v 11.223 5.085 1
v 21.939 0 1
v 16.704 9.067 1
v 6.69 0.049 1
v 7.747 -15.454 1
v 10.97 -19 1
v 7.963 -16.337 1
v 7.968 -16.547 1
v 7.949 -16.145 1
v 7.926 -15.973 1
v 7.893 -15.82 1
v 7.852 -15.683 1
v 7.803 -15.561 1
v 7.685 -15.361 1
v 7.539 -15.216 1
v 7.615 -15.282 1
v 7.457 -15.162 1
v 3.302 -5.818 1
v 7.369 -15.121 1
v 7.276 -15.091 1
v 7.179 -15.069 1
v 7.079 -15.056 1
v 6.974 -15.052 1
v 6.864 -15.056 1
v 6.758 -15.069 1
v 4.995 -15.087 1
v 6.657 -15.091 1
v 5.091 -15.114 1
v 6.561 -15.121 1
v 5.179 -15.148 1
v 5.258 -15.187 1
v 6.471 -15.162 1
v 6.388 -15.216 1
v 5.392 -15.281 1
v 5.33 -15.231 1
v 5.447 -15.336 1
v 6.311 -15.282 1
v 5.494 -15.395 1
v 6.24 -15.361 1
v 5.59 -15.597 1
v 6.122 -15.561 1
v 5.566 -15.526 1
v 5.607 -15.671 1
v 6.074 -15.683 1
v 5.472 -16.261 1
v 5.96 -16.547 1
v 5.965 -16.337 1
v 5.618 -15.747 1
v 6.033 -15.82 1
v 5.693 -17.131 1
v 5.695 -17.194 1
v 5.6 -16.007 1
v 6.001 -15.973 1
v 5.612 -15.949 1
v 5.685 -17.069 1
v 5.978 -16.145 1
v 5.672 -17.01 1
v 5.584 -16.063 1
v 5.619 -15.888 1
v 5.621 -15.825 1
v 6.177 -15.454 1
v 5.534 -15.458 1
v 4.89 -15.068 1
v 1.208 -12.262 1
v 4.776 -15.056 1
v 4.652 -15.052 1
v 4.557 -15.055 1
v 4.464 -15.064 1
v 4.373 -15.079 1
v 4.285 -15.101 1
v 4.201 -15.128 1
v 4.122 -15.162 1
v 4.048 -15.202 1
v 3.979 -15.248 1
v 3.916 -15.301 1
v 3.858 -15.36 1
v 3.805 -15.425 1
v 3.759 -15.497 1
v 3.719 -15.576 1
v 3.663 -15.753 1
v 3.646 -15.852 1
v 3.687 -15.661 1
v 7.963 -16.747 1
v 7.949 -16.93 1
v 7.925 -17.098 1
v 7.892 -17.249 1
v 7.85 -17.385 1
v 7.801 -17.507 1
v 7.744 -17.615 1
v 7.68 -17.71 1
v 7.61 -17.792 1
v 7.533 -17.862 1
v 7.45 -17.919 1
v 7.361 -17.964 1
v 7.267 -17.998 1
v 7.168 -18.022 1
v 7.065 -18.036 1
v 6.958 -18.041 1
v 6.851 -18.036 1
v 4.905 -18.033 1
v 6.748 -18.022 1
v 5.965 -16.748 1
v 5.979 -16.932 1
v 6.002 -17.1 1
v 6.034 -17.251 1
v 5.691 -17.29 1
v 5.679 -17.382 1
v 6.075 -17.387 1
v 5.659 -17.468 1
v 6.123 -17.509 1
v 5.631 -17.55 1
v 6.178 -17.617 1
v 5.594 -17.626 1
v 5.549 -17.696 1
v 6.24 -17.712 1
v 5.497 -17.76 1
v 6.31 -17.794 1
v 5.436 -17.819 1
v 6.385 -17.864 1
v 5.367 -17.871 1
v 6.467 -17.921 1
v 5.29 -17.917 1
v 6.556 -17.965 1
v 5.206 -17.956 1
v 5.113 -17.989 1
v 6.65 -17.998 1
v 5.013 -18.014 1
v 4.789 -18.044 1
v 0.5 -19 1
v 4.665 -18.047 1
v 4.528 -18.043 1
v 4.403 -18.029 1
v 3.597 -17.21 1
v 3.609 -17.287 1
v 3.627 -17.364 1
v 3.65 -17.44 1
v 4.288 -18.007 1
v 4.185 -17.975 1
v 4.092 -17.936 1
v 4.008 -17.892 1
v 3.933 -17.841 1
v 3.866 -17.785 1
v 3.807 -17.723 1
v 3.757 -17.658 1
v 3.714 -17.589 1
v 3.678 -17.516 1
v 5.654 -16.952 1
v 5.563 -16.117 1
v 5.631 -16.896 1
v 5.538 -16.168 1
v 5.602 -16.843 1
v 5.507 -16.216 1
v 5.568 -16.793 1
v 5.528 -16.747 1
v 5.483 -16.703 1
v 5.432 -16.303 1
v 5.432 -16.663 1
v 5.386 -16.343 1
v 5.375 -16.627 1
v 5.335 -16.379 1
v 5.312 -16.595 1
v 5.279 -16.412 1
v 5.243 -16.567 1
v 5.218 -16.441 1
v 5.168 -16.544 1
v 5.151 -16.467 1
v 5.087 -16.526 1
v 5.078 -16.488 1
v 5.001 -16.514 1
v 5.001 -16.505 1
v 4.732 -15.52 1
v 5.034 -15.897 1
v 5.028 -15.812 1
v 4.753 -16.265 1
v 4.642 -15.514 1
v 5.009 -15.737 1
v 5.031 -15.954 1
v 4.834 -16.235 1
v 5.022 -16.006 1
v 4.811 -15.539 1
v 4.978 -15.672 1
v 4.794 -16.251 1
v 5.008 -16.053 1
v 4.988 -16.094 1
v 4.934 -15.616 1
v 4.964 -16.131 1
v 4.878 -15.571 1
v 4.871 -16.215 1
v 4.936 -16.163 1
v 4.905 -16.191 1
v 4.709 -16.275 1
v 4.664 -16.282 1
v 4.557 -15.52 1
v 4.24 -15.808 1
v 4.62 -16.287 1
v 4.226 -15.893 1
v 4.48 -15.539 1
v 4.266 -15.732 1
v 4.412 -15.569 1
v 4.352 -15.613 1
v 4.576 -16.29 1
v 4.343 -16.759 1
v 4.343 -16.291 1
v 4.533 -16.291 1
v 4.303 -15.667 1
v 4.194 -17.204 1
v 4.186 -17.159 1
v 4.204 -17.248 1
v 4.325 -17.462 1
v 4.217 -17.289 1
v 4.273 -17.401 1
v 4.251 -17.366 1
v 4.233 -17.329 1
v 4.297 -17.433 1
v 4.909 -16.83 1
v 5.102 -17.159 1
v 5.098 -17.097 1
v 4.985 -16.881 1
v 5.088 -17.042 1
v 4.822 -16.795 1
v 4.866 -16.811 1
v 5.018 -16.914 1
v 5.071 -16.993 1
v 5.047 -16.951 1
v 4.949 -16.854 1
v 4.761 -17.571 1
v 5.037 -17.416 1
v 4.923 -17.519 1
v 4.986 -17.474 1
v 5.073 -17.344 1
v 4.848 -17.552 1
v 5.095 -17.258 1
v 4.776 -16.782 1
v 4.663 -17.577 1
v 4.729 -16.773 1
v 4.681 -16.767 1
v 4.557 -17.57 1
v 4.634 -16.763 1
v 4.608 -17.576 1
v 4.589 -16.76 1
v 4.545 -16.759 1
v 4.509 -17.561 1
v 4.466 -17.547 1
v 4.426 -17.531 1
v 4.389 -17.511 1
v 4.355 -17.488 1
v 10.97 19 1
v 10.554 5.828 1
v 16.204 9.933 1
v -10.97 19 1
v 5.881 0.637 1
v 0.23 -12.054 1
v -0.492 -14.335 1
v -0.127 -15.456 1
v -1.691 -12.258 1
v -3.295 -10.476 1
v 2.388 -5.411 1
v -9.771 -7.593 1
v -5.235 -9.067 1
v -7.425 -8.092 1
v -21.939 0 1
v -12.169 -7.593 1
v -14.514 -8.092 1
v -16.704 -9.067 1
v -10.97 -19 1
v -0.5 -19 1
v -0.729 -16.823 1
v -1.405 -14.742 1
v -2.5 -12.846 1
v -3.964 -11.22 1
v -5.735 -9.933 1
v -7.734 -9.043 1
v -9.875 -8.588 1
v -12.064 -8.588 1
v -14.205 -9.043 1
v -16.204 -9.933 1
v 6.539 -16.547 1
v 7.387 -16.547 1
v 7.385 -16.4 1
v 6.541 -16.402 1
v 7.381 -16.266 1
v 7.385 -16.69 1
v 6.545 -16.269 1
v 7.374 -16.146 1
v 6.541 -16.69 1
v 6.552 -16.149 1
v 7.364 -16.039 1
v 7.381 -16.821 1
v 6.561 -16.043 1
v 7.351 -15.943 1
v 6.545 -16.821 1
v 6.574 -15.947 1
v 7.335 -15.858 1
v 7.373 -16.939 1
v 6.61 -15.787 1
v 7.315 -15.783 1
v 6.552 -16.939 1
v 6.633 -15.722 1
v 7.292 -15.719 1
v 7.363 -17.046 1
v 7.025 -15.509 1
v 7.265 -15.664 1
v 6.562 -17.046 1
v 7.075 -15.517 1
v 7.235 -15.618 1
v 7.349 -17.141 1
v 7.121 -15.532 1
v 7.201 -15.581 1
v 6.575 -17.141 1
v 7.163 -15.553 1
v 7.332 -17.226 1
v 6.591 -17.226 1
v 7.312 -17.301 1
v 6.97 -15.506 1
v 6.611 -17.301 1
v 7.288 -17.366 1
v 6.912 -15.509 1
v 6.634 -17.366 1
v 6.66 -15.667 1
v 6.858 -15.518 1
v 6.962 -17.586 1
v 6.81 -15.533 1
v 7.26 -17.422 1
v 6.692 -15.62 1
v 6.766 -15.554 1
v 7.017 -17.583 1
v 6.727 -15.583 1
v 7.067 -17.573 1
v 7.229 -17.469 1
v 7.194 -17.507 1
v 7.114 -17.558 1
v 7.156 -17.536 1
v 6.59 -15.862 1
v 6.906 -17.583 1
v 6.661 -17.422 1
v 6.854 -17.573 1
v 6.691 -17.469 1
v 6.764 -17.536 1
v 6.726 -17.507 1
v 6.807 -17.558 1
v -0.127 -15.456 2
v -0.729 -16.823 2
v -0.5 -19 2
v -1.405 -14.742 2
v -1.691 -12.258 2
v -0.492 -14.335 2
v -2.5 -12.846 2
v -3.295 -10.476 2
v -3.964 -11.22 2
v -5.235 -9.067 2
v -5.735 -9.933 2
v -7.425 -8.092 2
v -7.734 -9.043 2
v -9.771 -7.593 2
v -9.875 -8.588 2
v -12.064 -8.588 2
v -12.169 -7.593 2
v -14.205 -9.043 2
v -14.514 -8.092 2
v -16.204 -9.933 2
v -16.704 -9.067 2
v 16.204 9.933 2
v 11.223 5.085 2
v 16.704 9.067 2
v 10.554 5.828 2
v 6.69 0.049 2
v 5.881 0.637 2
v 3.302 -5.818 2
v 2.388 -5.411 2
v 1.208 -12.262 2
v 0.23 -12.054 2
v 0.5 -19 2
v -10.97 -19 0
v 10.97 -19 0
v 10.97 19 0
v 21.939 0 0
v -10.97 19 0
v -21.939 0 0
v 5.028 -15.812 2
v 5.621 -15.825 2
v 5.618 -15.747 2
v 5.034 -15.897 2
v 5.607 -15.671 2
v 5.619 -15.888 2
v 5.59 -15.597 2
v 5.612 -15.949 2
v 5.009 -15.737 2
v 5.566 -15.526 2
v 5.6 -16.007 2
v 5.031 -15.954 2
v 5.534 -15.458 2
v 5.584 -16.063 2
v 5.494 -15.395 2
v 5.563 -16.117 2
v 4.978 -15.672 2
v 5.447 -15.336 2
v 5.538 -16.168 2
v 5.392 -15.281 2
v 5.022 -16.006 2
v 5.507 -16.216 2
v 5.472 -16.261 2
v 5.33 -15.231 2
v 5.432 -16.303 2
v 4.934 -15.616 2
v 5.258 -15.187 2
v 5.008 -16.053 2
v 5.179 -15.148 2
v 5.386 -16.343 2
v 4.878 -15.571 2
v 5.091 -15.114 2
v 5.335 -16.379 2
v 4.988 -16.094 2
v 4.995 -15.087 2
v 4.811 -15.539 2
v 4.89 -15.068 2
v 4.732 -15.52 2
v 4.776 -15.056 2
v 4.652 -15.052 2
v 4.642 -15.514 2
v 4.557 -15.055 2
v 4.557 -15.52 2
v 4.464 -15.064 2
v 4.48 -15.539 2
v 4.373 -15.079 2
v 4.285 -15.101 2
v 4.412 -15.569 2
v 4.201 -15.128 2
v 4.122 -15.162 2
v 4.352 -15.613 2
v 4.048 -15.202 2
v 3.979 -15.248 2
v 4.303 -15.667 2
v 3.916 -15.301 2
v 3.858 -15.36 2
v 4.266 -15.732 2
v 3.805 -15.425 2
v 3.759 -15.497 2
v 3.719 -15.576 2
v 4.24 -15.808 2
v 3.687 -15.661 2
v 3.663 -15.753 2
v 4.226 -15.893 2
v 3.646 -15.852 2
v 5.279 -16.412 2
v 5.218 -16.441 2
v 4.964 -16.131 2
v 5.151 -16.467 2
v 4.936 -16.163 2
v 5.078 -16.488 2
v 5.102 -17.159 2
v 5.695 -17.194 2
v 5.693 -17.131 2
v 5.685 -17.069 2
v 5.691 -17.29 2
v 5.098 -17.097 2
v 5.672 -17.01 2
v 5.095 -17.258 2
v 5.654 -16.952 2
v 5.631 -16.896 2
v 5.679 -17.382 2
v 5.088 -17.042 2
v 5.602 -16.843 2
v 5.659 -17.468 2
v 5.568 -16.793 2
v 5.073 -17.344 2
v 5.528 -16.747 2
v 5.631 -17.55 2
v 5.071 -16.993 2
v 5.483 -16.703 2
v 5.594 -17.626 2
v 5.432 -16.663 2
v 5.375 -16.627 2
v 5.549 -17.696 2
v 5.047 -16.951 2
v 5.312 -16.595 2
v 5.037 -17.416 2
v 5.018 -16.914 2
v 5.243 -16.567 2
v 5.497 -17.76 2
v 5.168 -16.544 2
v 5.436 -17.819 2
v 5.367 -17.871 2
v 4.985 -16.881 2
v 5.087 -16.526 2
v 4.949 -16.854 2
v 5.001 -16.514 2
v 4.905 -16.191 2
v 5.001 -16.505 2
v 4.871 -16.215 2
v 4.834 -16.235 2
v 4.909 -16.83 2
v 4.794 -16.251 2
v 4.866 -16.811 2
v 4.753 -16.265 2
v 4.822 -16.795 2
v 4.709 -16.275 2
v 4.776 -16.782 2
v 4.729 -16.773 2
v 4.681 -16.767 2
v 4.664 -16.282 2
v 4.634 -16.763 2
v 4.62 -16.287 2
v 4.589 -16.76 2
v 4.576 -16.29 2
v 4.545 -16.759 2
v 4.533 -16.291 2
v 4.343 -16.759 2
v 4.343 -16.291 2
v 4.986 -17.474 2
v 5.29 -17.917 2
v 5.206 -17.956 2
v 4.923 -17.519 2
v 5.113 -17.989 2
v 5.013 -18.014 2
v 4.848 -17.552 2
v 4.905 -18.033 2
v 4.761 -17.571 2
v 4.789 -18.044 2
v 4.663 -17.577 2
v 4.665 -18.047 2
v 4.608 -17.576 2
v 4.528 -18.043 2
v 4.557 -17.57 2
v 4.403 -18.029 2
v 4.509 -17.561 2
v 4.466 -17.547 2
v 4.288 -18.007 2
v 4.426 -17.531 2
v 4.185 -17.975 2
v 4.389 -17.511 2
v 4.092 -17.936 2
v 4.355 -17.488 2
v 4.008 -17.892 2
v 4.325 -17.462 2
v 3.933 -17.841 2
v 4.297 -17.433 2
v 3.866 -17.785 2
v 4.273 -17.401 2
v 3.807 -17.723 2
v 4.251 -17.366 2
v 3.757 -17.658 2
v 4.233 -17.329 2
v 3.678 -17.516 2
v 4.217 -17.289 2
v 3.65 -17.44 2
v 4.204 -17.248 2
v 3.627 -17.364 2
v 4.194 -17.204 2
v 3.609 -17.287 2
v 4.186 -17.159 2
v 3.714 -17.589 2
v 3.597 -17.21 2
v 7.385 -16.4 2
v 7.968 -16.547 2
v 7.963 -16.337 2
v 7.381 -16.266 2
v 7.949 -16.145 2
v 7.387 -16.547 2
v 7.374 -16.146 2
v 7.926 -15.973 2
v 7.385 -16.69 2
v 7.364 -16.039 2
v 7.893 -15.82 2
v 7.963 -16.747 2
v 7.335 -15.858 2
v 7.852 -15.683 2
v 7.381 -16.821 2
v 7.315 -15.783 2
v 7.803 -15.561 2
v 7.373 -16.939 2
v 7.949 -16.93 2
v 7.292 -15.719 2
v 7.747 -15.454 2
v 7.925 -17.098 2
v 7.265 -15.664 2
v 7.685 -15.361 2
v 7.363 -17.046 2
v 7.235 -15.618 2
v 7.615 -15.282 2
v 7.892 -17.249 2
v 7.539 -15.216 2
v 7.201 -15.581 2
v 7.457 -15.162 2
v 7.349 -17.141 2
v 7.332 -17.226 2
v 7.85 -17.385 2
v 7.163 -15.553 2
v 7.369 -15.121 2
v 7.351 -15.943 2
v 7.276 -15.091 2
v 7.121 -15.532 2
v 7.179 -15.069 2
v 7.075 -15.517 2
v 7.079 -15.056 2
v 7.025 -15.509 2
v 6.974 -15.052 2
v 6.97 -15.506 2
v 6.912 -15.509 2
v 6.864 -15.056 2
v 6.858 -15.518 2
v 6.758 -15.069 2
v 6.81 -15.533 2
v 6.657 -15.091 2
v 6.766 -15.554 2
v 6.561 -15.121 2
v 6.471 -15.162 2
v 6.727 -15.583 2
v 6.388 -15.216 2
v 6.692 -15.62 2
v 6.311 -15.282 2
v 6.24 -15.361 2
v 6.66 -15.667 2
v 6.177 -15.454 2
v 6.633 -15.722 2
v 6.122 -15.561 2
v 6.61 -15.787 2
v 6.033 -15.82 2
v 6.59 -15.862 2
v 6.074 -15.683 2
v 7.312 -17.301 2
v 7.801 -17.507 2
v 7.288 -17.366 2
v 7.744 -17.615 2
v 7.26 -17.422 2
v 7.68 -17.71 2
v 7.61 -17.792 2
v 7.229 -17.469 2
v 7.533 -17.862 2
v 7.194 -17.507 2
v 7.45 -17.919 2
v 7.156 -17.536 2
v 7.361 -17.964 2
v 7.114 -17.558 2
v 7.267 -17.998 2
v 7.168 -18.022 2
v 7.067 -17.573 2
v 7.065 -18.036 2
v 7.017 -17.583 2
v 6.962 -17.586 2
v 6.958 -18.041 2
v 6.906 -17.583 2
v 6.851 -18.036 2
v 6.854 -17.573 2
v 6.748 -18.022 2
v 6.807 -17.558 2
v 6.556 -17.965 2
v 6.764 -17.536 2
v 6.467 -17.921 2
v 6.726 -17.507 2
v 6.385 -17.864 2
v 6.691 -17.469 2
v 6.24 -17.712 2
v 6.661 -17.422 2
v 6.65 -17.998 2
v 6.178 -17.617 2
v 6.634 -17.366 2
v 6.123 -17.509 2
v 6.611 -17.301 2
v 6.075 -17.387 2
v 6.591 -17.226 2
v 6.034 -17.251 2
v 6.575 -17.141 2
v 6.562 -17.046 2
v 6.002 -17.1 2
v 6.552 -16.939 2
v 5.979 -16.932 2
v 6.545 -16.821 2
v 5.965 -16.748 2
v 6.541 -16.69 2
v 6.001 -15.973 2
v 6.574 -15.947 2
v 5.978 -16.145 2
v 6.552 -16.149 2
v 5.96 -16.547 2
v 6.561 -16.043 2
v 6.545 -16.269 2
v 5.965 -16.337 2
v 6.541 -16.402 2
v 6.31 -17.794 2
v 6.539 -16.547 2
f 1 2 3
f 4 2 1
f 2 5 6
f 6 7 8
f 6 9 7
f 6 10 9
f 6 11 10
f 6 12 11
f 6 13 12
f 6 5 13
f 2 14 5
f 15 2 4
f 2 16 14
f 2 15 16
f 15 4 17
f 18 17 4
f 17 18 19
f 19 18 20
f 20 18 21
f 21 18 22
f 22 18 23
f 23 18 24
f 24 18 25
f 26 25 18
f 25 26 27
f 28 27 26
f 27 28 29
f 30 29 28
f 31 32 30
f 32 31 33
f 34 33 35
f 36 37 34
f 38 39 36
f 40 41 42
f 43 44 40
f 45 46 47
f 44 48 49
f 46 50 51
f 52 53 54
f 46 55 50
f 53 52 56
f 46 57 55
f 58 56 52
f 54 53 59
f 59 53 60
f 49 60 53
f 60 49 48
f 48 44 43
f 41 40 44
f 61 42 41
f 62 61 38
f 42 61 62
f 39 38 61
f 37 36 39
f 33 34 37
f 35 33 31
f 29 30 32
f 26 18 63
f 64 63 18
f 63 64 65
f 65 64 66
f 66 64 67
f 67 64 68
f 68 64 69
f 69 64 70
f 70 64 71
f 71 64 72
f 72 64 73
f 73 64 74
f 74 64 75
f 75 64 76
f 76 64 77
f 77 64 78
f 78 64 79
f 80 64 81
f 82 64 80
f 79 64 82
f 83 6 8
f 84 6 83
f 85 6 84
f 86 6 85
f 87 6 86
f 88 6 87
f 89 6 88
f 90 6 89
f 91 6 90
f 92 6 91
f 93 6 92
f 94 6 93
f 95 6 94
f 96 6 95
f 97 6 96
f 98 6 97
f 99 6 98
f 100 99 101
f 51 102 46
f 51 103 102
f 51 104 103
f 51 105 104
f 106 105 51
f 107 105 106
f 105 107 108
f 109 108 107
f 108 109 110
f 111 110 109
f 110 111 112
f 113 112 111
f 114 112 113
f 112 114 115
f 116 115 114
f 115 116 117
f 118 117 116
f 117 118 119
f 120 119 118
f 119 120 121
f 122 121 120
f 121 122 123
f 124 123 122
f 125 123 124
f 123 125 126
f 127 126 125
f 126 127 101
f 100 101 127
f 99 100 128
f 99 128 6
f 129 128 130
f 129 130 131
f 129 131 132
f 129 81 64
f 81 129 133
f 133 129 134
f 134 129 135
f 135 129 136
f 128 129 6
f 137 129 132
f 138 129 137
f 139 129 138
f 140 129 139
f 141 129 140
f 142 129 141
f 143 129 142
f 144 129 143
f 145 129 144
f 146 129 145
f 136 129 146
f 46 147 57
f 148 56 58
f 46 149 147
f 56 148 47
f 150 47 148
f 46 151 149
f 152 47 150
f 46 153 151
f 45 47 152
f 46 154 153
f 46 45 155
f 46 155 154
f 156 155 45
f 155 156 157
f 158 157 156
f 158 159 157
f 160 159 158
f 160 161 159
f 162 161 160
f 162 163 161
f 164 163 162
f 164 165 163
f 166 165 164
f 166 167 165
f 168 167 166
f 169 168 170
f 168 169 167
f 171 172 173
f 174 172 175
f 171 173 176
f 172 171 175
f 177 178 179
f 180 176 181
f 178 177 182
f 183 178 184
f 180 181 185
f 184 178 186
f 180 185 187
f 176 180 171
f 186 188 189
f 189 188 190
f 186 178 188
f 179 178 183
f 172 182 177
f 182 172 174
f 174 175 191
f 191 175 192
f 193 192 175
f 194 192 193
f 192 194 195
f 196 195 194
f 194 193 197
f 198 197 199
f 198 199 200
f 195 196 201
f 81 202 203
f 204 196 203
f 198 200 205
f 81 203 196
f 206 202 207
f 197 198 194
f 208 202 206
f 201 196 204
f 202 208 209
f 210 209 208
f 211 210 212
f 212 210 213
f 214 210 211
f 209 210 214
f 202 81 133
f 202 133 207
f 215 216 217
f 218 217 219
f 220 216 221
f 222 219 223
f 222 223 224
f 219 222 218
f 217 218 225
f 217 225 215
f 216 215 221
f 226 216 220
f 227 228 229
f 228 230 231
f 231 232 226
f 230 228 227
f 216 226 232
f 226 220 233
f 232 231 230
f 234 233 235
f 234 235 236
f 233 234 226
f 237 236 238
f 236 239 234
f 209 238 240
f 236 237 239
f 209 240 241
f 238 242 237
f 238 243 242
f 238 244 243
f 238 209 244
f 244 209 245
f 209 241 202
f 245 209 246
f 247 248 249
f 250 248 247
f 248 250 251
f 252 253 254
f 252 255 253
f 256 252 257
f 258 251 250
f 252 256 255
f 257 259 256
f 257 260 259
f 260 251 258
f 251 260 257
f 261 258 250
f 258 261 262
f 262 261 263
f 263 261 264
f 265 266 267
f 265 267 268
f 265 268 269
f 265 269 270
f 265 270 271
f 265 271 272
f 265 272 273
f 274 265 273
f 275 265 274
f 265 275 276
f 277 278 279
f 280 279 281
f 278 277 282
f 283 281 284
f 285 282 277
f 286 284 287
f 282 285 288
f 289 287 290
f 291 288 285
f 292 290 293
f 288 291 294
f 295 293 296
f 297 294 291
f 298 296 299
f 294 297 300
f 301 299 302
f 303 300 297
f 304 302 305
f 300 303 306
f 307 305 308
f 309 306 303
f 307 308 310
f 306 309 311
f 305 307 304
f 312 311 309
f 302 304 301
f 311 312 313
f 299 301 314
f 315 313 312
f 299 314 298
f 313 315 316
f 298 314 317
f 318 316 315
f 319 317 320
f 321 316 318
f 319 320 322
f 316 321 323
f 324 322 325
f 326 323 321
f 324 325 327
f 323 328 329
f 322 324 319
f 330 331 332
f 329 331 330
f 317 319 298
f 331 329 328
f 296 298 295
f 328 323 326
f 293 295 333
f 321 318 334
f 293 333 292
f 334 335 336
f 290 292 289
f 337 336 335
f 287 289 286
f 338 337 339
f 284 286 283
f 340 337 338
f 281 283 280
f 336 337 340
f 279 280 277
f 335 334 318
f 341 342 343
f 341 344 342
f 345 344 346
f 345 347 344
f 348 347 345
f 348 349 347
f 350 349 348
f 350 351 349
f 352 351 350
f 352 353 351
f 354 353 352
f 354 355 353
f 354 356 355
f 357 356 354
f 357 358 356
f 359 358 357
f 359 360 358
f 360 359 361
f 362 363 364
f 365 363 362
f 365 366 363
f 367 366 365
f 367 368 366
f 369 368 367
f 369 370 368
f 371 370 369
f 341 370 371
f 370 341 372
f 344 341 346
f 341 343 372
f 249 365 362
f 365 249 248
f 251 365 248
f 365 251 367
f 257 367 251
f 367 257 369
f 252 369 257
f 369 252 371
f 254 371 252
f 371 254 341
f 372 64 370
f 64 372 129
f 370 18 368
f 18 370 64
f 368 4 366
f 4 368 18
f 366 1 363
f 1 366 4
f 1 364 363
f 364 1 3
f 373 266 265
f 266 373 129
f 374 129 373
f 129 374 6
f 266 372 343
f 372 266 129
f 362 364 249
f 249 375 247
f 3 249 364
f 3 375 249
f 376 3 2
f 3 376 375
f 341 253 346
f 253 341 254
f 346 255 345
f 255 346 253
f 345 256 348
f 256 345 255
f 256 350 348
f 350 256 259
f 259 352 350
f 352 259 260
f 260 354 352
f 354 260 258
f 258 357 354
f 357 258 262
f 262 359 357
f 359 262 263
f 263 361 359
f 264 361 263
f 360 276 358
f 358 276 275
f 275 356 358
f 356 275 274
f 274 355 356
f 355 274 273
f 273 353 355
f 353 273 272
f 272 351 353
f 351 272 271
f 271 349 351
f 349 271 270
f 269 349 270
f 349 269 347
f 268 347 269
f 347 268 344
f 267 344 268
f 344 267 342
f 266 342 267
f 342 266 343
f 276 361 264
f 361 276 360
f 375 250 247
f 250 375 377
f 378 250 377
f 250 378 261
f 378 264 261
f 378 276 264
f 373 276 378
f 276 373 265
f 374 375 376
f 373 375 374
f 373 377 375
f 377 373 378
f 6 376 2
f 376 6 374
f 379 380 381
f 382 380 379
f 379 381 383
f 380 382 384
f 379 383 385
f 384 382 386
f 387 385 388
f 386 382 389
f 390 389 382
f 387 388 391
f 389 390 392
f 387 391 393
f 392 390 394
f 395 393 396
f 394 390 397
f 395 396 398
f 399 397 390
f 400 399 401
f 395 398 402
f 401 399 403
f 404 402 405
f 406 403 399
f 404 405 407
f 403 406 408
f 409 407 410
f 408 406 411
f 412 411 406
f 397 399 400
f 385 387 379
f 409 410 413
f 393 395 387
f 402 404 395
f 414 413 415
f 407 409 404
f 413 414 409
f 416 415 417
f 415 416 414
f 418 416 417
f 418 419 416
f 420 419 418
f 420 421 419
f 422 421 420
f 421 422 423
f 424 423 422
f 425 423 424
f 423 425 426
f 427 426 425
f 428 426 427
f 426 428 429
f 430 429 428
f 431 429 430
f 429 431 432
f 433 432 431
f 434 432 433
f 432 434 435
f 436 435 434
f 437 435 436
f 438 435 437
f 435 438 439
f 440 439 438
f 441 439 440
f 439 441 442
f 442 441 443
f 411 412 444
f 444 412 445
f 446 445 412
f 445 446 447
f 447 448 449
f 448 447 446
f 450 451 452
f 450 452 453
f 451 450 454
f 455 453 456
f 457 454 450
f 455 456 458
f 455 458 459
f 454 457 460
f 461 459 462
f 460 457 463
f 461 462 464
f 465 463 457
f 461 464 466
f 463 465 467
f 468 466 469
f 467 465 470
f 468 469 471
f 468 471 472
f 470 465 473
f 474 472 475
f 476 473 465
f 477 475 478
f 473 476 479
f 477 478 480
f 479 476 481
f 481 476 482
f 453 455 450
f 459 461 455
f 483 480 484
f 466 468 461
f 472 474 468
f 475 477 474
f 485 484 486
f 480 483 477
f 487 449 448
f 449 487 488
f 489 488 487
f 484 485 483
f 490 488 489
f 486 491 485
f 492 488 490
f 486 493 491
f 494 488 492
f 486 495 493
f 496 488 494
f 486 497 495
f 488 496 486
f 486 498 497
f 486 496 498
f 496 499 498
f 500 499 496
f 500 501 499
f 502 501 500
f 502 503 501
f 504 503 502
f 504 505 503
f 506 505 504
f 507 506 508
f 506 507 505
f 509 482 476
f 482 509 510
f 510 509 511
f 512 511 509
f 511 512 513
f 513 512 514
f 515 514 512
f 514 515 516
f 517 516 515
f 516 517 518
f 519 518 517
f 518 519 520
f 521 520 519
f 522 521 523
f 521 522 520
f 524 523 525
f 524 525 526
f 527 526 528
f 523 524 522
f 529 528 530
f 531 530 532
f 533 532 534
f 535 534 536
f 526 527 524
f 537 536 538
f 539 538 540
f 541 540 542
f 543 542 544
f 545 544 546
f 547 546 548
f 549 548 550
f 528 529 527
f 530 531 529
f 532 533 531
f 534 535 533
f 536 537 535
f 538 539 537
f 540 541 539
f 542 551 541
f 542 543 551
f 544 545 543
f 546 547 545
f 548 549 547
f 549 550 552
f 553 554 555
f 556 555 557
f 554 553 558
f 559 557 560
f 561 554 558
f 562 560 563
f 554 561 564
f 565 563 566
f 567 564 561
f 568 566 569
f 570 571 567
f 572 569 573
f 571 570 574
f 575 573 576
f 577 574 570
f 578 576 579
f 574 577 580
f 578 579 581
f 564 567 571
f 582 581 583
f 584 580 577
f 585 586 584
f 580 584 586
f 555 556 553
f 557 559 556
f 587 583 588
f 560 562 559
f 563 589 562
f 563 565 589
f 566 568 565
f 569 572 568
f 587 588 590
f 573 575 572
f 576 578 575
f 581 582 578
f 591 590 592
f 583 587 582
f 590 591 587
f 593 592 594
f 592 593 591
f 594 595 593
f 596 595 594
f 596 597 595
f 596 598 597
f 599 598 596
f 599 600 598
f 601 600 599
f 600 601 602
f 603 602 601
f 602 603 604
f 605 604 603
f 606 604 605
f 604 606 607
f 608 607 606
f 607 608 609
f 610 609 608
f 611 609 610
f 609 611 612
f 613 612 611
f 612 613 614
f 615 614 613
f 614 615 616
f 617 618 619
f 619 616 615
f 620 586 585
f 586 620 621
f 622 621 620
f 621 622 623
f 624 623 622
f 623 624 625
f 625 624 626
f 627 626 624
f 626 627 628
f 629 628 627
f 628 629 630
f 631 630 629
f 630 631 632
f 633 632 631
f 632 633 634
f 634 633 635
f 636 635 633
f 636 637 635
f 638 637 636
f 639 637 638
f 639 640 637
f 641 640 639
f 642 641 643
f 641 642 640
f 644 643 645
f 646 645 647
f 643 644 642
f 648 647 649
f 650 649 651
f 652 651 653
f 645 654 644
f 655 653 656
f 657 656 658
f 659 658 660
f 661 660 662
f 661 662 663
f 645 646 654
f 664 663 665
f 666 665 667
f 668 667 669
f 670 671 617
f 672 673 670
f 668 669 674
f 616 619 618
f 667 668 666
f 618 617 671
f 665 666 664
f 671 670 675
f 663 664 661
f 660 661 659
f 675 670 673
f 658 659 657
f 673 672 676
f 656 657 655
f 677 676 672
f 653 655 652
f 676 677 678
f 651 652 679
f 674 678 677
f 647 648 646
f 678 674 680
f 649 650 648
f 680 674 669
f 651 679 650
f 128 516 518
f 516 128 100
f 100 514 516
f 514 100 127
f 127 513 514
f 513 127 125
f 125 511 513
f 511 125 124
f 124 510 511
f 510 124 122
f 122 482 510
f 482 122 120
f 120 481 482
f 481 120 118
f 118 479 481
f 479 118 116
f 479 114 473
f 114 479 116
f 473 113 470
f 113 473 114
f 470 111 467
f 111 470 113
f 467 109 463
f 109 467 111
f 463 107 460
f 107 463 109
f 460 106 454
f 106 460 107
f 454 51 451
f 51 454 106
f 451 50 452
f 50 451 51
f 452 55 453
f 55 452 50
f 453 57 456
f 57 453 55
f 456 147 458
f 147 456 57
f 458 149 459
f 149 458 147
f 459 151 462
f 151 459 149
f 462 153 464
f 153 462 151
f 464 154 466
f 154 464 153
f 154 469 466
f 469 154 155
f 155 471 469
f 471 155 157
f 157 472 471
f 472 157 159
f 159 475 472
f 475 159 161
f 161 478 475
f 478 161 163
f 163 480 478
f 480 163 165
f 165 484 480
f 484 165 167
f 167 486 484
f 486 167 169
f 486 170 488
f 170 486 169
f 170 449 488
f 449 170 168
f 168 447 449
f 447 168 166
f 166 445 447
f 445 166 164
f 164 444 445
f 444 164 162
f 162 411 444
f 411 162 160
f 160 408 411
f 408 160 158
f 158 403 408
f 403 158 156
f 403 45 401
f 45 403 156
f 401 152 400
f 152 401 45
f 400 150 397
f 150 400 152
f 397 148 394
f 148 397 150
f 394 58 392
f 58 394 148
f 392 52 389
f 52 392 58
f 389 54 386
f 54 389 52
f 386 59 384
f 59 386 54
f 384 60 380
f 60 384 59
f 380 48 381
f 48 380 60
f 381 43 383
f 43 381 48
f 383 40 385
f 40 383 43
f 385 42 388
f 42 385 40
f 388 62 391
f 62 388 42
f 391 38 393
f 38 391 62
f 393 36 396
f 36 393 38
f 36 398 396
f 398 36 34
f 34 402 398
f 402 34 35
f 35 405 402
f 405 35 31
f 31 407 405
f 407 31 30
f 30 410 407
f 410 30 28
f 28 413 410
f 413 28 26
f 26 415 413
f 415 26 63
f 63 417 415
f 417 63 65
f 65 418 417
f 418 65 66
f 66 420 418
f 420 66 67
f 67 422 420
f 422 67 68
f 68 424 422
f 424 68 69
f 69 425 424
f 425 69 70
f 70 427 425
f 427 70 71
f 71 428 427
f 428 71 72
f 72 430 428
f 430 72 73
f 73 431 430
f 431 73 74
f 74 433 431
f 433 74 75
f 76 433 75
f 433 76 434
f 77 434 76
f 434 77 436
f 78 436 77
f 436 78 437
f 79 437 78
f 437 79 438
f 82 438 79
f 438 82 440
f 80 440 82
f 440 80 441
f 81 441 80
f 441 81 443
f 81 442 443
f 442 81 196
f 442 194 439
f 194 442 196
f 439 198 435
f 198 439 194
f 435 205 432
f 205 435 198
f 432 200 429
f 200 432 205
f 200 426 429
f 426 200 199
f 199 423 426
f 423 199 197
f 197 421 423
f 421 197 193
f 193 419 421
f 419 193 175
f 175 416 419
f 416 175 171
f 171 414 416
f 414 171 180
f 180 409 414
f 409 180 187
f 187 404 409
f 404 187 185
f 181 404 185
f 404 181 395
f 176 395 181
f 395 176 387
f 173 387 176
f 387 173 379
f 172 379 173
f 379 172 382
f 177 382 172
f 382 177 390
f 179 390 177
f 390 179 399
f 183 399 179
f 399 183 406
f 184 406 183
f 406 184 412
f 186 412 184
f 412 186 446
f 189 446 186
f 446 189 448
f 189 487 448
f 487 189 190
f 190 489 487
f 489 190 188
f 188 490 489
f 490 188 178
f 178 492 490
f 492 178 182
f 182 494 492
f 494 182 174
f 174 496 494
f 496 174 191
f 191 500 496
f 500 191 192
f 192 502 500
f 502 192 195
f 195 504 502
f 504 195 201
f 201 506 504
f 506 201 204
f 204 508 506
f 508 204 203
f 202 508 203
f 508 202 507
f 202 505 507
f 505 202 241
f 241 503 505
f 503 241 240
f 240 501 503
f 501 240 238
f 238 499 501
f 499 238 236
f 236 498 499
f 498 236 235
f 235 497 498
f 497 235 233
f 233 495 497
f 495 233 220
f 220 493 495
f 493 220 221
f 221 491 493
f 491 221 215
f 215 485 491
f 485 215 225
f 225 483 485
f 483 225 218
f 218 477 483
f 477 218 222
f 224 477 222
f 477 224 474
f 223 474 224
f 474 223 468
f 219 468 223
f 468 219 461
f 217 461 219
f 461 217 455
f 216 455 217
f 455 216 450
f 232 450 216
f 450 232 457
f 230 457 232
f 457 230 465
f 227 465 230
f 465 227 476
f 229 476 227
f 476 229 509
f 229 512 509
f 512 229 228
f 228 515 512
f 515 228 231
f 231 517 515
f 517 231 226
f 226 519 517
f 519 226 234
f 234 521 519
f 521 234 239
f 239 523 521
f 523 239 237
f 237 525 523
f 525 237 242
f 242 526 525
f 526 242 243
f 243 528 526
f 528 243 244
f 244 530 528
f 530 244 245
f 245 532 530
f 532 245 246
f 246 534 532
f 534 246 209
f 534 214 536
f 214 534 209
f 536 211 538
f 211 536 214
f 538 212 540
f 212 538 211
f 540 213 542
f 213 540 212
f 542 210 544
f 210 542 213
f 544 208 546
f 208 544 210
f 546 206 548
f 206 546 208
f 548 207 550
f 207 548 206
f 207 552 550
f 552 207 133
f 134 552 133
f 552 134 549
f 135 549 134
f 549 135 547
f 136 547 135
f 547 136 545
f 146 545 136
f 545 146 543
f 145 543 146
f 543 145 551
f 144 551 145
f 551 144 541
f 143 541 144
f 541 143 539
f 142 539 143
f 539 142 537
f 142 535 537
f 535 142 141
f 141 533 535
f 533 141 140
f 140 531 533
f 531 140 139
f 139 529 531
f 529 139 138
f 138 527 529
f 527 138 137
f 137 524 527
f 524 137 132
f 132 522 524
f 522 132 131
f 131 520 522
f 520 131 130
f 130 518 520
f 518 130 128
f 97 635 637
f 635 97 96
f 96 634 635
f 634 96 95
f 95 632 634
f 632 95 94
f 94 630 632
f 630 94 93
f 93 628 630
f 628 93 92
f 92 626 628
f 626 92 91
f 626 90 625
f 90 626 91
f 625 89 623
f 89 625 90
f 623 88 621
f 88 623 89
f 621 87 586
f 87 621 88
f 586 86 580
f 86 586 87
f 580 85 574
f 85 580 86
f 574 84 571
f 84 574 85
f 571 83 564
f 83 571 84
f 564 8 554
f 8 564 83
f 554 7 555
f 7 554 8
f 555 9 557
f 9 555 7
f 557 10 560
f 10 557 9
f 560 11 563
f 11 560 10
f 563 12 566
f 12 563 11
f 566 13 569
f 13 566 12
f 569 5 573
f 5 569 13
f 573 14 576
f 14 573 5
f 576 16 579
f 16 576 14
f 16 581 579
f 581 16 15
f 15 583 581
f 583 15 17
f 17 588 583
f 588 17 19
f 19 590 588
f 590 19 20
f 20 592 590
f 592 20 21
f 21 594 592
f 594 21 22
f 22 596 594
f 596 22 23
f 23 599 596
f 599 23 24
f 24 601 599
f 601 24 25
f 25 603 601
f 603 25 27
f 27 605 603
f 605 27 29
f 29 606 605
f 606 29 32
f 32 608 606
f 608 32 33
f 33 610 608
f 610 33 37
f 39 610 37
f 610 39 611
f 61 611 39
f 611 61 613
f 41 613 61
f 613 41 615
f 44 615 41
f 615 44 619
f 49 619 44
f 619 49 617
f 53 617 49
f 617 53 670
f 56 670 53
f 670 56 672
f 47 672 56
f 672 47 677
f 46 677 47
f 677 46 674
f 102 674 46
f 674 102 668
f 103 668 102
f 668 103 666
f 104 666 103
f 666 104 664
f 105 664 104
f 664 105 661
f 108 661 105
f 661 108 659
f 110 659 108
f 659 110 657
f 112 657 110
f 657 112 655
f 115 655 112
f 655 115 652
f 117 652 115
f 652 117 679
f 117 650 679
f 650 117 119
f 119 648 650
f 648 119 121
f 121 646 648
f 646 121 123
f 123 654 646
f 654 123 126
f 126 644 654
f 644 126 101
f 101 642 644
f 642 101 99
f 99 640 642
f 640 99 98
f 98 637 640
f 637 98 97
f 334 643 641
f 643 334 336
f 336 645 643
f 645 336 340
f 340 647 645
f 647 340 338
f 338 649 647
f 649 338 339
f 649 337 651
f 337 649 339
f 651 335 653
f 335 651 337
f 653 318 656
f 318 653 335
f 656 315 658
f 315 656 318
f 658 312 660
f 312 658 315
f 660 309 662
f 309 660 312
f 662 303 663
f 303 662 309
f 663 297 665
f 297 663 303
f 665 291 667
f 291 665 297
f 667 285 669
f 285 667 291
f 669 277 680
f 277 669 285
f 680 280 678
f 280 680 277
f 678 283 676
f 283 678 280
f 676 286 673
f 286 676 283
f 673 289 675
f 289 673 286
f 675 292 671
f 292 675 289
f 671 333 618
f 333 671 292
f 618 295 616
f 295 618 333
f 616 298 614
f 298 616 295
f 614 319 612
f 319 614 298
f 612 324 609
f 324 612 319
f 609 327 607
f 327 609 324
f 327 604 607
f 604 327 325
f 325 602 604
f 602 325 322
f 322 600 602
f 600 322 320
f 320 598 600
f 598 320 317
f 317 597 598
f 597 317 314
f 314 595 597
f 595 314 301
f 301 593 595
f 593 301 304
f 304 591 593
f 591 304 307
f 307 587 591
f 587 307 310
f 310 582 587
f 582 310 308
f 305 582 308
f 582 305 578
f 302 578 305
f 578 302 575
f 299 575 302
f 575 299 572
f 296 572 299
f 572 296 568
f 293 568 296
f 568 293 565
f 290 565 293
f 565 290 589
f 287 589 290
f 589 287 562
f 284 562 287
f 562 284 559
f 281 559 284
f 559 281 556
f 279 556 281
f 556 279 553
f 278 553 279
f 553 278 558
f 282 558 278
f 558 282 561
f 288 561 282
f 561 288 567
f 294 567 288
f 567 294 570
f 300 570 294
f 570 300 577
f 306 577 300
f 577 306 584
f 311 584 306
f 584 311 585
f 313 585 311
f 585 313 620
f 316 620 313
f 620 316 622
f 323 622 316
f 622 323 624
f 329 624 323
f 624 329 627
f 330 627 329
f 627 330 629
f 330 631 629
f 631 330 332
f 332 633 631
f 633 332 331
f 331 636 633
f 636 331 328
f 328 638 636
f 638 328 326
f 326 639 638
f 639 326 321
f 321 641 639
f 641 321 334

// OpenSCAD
include <../Scripts/18xx tiles basic functions.scad>
hex("Green");
put_tilenr("30");
light_curve(r=0);
sharp_curve(r=5);
